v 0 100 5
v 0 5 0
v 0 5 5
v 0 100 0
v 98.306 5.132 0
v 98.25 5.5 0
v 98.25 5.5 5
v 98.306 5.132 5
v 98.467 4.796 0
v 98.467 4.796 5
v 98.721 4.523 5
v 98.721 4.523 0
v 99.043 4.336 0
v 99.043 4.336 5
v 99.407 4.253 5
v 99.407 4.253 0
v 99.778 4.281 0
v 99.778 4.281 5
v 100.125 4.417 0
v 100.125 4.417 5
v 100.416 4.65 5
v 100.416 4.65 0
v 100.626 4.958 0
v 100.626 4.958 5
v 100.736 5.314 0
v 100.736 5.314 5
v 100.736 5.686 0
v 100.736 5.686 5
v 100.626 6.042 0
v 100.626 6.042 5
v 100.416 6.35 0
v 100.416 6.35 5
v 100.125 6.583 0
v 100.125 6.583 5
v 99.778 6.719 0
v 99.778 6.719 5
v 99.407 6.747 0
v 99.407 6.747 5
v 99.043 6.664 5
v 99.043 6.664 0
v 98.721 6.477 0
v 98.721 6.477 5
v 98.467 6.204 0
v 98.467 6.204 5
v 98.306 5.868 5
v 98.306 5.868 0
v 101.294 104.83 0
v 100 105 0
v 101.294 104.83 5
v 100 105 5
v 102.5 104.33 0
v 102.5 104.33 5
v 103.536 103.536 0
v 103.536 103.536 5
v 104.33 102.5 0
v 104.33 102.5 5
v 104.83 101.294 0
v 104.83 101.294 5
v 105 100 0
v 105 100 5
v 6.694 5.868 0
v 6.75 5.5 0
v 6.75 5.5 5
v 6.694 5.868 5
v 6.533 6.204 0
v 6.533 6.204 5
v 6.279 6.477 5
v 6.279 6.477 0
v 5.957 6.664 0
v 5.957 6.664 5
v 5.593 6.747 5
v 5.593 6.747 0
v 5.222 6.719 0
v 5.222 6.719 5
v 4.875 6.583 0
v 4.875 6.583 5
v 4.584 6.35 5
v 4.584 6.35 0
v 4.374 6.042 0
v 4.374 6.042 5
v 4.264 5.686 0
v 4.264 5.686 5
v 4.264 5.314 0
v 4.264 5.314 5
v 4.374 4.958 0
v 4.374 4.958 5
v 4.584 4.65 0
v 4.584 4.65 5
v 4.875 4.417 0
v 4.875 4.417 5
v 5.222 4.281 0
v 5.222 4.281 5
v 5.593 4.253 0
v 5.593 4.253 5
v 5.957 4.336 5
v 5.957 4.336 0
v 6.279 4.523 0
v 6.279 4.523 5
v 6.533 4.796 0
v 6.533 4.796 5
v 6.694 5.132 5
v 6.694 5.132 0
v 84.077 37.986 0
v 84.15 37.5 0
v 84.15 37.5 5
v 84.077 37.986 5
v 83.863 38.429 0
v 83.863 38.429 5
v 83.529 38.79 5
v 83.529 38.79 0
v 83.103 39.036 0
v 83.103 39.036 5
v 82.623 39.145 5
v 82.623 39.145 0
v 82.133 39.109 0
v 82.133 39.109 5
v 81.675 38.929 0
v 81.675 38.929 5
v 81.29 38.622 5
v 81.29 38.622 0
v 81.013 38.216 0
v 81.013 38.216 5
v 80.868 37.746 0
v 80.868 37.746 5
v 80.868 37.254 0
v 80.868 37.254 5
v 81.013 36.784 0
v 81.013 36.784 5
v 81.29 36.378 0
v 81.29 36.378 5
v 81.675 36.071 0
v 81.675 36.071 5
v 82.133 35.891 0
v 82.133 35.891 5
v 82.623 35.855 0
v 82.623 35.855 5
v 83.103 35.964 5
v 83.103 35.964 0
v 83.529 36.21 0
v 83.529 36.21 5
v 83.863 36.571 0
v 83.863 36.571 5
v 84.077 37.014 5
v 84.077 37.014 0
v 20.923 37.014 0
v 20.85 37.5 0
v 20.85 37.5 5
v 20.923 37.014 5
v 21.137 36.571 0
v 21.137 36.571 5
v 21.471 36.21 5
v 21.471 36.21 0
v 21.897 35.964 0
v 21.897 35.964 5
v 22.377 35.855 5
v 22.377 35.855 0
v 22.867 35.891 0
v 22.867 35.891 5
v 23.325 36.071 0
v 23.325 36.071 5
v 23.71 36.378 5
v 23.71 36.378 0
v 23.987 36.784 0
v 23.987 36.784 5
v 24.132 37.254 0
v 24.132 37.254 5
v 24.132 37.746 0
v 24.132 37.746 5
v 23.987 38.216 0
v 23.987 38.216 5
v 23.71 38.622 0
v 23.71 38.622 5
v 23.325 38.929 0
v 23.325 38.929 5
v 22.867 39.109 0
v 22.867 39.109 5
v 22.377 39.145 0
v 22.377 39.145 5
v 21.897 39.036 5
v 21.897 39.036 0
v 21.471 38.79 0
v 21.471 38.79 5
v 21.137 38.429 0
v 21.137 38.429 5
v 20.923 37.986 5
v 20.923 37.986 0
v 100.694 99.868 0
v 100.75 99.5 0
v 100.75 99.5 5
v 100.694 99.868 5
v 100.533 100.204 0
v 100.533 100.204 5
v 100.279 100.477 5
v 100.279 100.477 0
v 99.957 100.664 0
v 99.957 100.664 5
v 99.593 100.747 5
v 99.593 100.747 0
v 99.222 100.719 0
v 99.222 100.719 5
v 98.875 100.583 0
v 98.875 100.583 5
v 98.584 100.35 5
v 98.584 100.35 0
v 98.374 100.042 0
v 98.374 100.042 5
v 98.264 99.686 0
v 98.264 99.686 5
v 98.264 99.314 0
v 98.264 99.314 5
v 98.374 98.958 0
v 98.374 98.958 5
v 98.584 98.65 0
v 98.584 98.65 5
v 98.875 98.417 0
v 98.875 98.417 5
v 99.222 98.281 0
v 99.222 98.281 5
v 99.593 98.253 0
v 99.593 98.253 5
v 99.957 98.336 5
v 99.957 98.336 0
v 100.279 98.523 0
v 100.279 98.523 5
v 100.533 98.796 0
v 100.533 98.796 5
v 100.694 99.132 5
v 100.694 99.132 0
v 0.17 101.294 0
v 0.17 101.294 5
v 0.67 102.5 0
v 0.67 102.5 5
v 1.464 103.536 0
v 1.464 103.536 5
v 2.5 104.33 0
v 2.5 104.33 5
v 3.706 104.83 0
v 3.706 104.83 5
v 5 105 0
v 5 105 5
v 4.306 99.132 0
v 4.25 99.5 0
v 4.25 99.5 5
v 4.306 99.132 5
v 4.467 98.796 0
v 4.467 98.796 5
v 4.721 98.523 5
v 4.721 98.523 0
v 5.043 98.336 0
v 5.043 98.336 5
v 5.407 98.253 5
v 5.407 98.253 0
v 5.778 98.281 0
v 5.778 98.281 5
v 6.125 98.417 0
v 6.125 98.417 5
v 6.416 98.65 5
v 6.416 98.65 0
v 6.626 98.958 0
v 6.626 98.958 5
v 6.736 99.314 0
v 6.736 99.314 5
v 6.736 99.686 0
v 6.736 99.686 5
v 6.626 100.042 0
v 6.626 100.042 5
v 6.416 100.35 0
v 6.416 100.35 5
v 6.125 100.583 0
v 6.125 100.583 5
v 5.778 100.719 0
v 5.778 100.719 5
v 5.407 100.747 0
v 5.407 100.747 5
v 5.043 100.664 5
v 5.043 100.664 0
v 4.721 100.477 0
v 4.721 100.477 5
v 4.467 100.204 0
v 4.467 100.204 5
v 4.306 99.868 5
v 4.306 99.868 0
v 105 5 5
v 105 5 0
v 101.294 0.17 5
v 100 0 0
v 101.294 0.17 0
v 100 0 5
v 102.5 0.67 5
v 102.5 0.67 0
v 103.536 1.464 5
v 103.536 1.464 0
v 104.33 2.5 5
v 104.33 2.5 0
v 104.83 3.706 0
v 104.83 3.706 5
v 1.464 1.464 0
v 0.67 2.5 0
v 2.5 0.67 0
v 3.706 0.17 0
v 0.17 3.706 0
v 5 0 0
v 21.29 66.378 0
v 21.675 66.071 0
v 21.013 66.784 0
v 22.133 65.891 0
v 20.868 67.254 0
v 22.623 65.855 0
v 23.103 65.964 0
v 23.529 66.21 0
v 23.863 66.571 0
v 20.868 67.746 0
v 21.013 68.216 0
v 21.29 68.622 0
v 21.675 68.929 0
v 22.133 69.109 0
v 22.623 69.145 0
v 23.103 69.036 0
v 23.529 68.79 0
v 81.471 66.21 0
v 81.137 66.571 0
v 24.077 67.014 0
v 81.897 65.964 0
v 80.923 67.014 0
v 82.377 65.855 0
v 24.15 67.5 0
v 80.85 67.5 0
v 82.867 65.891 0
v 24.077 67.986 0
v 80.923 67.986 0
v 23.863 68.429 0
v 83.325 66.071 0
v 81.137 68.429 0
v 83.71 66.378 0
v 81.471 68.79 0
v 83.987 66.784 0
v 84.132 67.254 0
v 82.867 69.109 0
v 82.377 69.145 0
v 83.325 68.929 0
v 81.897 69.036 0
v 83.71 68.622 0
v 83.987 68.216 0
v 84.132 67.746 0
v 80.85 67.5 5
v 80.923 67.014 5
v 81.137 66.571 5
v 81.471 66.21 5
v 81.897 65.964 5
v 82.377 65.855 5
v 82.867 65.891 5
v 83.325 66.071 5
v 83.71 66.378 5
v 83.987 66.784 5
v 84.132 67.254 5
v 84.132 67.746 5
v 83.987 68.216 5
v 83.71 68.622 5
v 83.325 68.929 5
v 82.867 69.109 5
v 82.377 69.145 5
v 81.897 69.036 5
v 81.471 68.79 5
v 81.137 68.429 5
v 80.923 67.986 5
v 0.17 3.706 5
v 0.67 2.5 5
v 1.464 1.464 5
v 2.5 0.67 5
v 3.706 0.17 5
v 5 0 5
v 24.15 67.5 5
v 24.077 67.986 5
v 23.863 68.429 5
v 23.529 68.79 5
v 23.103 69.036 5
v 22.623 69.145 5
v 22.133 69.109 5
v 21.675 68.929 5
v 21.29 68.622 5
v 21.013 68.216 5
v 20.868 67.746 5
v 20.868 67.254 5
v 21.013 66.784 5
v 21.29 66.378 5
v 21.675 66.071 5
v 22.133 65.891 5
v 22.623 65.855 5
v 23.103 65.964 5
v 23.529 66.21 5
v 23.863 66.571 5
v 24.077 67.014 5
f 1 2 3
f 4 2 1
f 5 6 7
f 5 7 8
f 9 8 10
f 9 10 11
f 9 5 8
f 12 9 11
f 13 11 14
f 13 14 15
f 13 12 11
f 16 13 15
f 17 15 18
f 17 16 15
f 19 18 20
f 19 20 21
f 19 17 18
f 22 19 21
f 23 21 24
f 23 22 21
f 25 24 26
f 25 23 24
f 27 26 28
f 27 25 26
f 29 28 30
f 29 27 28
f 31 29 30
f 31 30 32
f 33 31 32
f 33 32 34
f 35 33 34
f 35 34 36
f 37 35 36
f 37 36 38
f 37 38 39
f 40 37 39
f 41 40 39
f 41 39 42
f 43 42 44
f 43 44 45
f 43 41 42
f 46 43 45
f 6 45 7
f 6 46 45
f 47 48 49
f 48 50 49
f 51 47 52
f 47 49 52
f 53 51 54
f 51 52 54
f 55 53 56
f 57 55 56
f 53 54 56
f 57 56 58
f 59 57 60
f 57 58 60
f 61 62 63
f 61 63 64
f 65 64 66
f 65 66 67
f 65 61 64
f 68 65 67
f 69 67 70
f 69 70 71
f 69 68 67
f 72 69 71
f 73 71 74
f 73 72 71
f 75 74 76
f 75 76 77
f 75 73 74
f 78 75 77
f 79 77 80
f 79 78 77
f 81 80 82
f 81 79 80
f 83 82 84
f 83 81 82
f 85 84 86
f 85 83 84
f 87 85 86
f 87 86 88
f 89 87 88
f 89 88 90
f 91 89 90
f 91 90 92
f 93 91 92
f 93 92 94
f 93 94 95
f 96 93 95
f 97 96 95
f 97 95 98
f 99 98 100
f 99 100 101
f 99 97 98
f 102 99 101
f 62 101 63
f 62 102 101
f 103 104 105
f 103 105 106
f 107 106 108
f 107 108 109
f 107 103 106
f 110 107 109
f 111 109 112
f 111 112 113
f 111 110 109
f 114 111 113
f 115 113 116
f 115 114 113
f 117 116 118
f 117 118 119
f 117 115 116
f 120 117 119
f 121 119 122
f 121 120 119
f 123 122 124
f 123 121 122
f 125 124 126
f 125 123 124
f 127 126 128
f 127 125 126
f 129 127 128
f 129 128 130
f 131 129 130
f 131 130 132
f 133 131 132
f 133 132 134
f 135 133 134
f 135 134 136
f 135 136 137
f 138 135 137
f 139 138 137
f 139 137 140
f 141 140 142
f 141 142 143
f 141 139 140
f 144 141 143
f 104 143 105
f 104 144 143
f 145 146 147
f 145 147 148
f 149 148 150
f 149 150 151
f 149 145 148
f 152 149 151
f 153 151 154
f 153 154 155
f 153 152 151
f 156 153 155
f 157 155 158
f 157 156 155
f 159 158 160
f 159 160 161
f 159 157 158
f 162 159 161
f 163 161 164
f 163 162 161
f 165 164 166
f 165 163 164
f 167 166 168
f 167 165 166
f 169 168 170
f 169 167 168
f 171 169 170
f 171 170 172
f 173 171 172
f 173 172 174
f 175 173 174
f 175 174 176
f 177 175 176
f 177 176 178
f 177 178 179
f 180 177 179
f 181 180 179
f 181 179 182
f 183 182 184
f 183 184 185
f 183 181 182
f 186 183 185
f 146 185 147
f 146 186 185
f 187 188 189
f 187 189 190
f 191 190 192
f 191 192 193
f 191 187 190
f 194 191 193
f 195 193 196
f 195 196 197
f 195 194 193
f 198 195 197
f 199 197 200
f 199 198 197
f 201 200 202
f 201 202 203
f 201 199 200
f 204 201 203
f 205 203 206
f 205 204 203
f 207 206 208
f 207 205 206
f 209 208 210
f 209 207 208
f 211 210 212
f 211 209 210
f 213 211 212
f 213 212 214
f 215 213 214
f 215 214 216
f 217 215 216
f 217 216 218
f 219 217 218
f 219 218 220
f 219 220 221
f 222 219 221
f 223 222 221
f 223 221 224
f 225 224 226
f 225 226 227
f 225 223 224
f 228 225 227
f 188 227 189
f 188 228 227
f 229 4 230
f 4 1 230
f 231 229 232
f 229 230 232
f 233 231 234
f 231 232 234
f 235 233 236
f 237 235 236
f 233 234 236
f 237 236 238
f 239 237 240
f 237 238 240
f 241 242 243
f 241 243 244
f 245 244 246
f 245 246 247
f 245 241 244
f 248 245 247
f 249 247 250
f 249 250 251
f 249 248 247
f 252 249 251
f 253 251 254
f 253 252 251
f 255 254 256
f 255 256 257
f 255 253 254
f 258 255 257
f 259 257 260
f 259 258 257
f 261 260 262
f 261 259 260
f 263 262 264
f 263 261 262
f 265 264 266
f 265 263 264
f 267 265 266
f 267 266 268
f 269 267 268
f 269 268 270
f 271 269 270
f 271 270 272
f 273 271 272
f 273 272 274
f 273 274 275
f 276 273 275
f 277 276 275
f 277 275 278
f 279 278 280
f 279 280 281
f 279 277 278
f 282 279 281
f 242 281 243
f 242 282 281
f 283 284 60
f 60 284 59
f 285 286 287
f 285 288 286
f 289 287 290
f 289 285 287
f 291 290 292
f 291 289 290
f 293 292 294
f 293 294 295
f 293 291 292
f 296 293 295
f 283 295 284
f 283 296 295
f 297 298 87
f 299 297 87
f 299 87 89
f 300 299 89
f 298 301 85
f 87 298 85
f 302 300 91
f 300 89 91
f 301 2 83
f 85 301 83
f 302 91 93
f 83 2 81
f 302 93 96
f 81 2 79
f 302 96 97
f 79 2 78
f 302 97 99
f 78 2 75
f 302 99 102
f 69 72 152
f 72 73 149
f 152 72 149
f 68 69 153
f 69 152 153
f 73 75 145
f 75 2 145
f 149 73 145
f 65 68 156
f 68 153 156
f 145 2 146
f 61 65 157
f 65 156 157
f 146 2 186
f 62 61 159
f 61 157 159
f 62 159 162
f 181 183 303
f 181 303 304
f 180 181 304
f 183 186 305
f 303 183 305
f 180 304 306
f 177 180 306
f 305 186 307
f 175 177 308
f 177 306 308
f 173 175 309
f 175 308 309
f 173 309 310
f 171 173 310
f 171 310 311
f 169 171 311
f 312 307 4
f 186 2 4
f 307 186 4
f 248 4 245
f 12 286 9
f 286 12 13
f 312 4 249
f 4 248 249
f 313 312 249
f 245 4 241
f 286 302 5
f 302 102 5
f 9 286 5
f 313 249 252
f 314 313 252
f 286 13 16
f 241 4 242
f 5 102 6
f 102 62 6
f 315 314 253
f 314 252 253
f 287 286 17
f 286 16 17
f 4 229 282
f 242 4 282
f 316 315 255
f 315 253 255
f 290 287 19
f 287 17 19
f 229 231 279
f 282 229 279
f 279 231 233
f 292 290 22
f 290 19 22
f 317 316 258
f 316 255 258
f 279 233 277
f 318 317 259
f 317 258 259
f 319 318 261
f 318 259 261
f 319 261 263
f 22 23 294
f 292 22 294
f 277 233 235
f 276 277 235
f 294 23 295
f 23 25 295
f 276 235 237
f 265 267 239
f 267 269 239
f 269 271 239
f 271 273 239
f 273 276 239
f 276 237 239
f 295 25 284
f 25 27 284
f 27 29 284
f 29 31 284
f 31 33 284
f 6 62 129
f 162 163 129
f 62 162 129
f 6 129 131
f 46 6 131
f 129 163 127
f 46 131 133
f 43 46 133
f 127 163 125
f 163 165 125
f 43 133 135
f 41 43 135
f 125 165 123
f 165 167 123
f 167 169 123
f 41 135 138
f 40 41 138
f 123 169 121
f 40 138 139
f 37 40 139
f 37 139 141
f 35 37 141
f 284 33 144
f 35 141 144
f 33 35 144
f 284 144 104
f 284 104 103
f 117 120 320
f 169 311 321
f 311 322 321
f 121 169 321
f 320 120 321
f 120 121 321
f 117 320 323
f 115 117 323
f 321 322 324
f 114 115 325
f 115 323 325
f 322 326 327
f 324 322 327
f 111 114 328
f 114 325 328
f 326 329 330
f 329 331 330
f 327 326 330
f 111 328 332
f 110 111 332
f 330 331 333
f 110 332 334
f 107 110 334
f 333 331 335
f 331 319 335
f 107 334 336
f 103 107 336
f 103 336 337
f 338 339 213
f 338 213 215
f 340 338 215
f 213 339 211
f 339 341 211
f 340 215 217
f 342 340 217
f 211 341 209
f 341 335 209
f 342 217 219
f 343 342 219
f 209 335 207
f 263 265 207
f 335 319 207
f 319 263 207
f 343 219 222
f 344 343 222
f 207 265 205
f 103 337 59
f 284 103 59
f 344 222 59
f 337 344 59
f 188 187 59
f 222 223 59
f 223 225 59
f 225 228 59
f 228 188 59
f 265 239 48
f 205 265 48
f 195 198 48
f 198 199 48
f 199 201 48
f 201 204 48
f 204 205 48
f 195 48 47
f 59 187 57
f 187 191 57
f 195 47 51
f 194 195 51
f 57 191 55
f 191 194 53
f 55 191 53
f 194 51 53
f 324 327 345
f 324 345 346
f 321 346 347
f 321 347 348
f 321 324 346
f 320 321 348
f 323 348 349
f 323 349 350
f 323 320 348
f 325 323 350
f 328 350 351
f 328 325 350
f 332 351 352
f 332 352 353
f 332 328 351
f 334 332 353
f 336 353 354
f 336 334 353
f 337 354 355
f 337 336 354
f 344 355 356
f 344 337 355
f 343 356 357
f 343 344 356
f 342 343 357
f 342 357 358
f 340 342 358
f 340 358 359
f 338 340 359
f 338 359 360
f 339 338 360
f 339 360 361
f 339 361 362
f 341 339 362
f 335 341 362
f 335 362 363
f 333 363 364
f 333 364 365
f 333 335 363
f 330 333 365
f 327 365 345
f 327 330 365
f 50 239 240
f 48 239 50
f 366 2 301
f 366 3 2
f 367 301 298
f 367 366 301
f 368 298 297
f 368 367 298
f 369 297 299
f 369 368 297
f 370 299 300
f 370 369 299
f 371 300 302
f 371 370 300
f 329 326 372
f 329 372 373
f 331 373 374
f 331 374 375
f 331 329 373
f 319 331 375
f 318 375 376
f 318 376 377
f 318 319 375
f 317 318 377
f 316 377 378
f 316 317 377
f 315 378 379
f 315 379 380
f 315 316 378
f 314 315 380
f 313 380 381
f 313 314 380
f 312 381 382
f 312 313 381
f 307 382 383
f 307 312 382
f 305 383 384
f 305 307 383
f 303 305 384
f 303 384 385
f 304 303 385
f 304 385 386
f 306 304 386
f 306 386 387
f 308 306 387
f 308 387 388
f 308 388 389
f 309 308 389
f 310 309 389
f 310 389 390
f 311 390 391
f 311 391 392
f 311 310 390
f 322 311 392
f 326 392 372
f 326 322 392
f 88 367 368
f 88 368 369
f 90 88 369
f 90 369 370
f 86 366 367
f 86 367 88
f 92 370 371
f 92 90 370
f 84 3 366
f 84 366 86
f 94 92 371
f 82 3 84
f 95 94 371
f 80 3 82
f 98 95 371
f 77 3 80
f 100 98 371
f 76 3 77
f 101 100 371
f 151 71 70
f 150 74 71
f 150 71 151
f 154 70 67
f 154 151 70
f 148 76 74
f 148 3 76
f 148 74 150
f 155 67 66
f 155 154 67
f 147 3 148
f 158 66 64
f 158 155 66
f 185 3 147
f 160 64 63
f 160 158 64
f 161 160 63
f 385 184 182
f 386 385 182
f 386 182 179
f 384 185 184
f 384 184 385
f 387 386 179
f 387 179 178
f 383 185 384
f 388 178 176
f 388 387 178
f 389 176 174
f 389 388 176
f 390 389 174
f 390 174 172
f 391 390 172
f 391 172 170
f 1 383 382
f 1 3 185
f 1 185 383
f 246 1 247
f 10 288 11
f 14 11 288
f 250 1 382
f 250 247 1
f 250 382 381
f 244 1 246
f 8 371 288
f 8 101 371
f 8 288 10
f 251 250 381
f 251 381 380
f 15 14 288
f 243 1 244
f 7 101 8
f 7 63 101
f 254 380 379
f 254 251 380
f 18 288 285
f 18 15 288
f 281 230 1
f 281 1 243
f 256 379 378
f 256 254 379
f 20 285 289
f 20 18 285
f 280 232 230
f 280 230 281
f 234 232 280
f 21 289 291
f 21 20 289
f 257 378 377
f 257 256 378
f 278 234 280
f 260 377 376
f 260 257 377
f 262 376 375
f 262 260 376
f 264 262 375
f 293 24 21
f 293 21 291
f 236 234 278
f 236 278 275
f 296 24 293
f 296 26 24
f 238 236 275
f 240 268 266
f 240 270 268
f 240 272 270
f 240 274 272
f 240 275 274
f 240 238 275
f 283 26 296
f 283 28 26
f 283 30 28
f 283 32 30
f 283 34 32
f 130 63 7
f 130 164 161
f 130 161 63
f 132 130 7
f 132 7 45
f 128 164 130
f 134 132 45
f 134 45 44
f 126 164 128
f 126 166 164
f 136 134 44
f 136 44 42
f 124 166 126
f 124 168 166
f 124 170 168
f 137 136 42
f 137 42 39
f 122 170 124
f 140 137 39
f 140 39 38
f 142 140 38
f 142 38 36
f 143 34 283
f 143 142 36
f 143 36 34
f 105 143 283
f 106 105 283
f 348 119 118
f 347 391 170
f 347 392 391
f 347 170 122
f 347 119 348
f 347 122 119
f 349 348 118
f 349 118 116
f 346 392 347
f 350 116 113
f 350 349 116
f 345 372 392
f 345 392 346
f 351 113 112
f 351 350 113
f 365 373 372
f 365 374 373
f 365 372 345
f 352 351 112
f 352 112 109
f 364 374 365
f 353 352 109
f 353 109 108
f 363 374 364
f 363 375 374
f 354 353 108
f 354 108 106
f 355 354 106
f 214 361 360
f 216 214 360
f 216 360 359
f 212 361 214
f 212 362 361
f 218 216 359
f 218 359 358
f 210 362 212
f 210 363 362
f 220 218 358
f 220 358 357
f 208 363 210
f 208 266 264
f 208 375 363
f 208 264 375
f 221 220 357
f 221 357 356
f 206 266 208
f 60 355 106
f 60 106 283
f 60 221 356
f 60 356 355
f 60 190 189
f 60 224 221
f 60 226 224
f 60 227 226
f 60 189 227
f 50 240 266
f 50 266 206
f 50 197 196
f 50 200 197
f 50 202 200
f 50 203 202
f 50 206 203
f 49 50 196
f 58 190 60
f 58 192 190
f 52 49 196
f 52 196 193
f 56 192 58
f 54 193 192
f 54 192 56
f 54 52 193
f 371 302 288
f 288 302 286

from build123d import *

# Parameters (mm, degrees)
ESQUISSE1_W        = 105
ESQUISSE1_H        = 105
ESQUISSE1_R        = 1.25
ESQUISSE1_R_2      = 1.65
BOSS_EXTRU_1_DEPTH = 5
CONG_1_R           = 5


with BuildPart() as part:
    # Esquisse1 → Boss.-Extru.1 (new body)
    with BuildSketch(Plane.XY):
        with Locations((52.5, 52.5)):
            Rectangle(ESQUISSE1_W, ESQUISSE1_H)
        with Locations((5.5, 5.5)):
            Circle(ESQUISSE1_R, mode=Mode.SUBTRACT)
        with Locations(Location((99.5, 5.5, 0), (0, 0, 180))):
            Circle(ESQUISSE1_R, mode=Mode.SUBTRACT)
        with Locations((99.5, 99.5)):
            Circle(ESQUISSE1_R, mode=Mode.SUBTRACT)
        with Locations(Location((5.5, 99.5, 0), (0, 0, 180))):
            Circle(ESQUISSE1_R, mode=Mode.SUBTRACT)
        with Locations((22.5, 67.5)):
            Circle(ESQUISSE1_R_2, mode=Mode.SUBTRACT)
        with Locations(Location((22.5, 37.5, 0), (0, 0, 180))):
            Circle(ESQUISSE1_R_2, mode=Mode.SUBTRACT)
        with Locations((82.5, 37.5)):
            Circle(ESQUISSE1_R_2, mode=Mode.SUBTRACT)
        with Locations(Location((82.5, 67.5, 0), (0, 0, 180))):
            Circle(ESQUISSE1_R_2, mode=Mode.SUBTRACT)
    extrude(amount=BOSS_EXTRU_1_DEPTH)

    # Congé1
    cong_1_edges = [part.edges().sort_by_distance(p)[0] for p in [
        (0, 105, 2.5),
        (105, 105, 2.5),
        (105, 0, 2.5),
        (0, 0, 2.5),
    ]]
    fillet(cong_1_edges, radius=CONG_1_R)


solid = part.part
